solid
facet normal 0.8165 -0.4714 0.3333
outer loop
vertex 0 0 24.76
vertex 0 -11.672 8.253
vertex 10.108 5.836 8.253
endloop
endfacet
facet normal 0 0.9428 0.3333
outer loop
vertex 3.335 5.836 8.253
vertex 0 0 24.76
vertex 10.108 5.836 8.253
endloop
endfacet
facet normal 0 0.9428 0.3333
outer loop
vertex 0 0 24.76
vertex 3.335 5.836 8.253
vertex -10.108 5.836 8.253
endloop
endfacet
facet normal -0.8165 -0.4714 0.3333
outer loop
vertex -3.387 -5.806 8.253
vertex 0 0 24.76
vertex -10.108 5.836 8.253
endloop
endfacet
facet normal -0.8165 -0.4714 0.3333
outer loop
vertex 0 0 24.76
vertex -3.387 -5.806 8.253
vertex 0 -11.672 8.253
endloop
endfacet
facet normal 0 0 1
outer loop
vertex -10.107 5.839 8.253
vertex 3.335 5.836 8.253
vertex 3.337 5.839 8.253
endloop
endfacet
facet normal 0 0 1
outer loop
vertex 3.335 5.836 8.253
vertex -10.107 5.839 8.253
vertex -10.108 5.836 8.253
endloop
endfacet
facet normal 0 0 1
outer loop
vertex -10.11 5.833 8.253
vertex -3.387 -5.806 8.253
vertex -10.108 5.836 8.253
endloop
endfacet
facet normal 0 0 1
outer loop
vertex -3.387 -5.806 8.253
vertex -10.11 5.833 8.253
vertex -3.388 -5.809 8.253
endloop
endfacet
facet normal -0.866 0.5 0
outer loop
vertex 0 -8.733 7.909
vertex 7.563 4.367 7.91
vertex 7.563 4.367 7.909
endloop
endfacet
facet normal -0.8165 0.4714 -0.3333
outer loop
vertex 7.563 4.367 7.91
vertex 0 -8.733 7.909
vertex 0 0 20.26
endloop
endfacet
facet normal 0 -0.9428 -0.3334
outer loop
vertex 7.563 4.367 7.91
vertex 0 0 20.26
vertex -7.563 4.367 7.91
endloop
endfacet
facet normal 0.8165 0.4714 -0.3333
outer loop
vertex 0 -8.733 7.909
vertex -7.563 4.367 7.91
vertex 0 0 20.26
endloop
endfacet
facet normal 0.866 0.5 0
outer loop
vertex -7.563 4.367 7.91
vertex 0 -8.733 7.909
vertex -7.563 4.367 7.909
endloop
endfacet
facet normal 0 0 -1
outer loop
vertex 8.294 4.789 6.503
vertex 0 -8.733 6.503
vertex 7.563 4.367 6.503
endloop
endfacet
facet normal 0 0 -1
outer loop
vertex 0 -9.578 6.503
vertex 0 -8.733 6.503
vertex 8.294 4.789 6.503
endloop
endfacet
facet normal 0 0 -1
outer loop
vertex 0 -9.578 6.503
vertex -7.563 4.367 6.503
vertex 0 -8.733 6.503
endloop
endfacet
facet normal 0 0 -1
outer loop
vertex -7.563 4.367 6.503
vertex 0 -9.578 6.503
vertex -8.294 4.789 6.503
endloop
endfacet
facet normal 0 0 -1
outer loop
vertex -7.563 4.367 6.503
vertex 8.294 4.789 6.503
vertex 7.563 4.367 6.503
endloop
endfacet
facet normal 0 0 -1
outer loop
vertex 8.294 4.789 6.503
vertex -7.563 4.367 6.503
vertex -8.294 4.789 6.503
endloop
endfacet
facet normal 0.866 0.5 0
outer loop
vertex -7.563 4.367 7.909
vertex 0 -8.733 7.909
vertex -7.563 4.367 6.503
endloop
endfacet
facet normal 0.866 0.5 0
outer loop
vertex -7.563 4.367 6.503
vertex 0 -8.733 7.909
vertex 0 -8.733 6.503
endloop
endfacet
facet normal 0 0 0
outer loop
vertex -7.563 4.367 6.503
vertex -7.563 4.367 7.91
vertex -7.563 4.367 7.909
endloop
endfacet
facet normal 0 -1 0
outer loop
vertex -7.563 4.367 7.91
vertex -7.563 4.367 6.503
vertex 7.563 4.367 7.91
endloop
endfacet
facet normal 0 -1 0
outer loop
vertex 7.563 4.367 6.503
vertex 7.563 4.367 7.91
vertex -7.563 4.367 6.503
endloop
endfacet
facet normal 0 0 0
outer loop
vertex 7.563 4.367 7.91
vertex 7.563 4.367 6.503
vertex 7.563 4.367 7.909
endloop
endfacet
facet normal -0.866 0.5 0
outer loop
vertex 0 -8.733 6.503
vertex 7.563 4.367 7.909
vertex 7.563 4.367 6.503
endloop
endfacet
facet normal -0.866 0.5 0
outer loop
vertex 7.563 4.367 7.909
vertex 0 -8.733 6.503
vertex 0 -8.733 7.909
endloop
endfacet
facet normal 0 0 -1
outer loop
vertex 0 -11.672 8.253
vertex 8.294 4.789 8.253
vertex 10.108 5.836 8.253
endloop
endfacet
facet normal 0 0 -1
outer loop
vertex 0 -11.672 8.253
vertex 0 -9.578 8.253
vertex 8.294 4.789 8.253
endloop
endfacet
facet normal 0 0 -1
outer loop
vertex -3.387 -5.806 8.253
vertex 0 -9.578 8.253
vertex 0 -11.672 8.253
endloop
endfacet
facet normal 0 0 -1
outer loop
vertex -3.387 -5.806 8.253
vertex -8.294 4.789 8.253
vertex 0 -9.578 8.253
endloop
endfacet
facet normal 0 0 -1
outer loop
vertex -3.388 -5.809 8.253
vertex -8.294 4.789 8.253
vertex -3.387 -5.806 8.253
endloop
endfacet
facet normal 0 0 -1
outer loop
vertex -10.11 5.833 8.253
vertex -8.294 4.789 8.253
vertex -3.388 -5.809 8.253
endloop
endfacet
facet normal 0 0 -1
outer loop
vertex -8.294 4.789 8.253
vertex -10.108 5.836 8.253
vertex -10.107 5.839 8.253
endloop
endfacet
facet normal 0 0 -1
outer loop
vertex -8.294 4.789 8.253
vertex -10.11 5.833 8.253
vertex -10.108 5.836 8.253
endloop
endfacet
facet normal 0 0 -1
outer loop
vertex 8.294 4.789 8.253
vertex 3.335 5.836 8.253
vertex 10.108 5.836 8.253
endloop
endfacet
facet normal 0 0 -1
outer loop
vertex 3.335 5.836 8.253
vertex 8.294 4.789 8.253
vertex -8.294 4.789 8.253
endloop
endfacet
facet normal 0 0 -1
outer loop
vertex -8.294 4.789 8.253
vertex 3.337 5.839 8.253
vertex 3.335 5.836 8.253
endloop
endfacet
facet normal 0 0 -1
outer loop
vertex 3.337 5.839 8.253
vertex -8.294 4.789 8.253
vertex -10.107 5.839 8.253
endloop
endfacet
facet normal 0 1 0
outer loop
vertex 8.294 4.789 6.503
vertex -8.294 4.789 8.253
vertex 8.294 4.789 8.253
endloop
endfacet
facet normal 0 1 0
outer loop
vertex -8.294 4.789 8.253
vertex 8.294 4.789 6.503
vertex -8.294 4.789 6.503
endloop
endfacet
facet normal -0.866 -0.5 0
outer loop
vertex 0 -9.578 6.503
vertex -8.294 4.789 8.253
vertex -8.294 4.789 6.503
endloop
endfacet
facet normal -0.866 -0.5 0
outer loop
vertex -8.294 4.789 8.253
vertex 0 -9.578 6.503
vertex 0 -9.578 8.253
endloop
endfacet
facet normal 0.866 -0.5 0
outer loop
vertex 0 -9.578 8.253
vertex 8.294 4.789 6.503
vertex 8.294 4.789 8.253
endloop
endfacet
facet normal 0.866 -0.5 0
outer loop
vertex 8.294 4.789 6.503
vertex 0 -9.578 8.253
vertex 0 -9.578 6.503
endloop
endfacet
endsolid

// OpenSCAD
arete = 40.433;
paroi = 1.5;
echelleReductionAjustementBouchon = 0.96;
r = 0.19; // résolution d'impression sur l'axe Z
tetra_sch = [3,3];
Cpi = 3.14159;
Cphi = (1+sqrt(5))/2;
Cepsilon = 0.00000001;

function tetra_ext_radius(a) = 
    a/4*sqrt(6);
    
function tetra_int_radius(a) = 
    a/12*sqrt(6);
    
function tetra_arete_from(radius) = 
    radius*12/sqrt(6);
    
externalRadius = tetra_ext_radius(arete);
internalRadius = tetra_ext_radius( 
                    tetra_arete_from(
                        tetra_int_radius(arete)-paroi));
                        
echo(externalRadius); 
echo(internalRadius);

//merkaba(arete);
//poly_creux();
//decoupe_bouchon();
//corps_ouvert();
bouchon();
//trou();

module corps_ouvert() {
	difference() {
		poly_creux();
		decoupe_bouchon();
	}
}

module bouchon() {
//    rotate([180, 0, 0])
//	scale([echelleReductionAjustementBouchon, echelleReductionAjustementBouchon, 0.995])
	difference () {
        intersection() {
            union() {
                poly_creux();
                supplement_feuillure_bouchon();
            }
            decoupe_bouchon(echelleReductionAjustementBouchon);
        }
	}
}

module poly_creux() {
	difference() {
        merkaba(externalRadius);
        merkaba(internalRadius);
	}
}

module decoupe_bouchon(scale=1) {
    distance = tetra_int_radius(arete);
	rotate([0,0,30]) translate([0,0,distance])
		cylinder(999, r=arete*0.2888, $fn=3);
	rotate([0,0,30]) translate([0,0,distance-paroi-1])
		cylinder(paroi+1, r=(arete-paroi)*0.246, $fn=3);
}

module supplement_feuillure_bouchon() {
    distance = tetra_int_radius(arete);
    rotate([0,0,30]) translate([0,0, distance-paroi+1])
    difference() {   
		cylinder(paroi+1, r=(arete-paroi)*0.25, $fn=3, center=true);
		cylinder(paroi+1, r=(arete-paroi)*0.25-1, $fn=3, center=true);
    }
}

module merkaba(rad) {
    union() {
        tetrahedron(rad);
        rotate([0,180,60]) tetrahedron(rad);
    }
}

module tetrahedron(rad) {
    // create an instance of a spherical coordinate
    // long - rotation around z -axis
    // lat - latitude, starting at 0 == 'north pole'
    // rad - distance from center
    function sph(long, lat, rad=1) = [long, lat, rad];
    
    // Convert spherical to cartesian
    function sph_to_cart(s) = [
	clean(s[2]*sin(s[1])*cos(s[0])),  

	clean(s[2]*sin(s[1])*sin(s[0])),

	clean(s[2]*cos(s[1]))
	];

    function sphu_from_cart(c, rad=1) = sph(
        atan2(c[1],c[0]), 
        atan2(sqrt(c[0]*c[0]+c[1]*c[1]), c[2]), 
        rad
        );

    tetra_cart = [
        [+1, +1, +1],
        [-1, -1, +1],
        [-1, +1, -1],
        [+1, -1, -1]
    ];

    function tetra_unit(rad=1) = [
        sph_to_cart(sphu_from_cart(tetra_cart[0], rad)), 
        sph_to_cart(sphu_from_cart(tetra_cart[1], rad)),
        sph_to_cart(sphu_from_cart(tetra_cart[2], rad)),
        sph_to_cart(sphu_from_cart(tetra_cart[3], rad)),
        ];


    tetrafaces = [
        [0, 3, 1],
        [0,1,2],
        [2,1,3],
        [0,2,3]
    ];

    tetra_edges = [
        [0,1],
        [0,2],
        [0,3], 
        [1,2], 
        [1,3], 
        [2,3],	
        ];

    rotate([54.735, 0, 0])
    rotate([0, 0, 45])
    polyhedron(tetra_unit(rad), faces=tetrafaces);
}
//translate([0, 0, -17.7])
//cylinder(5,40,40);

function clean(n) = (n < 0) ? ((n < -Cepsilon) ? n : 0) : 
	(n < Cepsilon) ? 0 : n; 

function plat_dihedral(pq) = 2 * asin( cos(180/pq[1])/sin(180/pq[0]));

function plat_circumradius(pq, a) = 
	(a/2)*
	tan(Cpi/pq[1])*
	tan(plat_dihedral(pq)/2);

function plat_midradius(pq, a) = 
	(a/2)*
	cos(Cpi/pq[0])*
	tan(plat_dihedral(pq)/2);

function plat_inradius(pq,a) = 
	a/(2*tan(Cpi/pq[0]))*
	sqrt((1-cos(plat_dihedral(pq)))/(1+cos(plat_dihedral(pq))));

function plat_a_from_inradius(pq, inradius) =
    inradius*(2*tan(Cpi/pq[0]))/
	sqrt((1-cos(plat_dihedral(pq)))/(1+cos(plat_dihedral(pq))));
